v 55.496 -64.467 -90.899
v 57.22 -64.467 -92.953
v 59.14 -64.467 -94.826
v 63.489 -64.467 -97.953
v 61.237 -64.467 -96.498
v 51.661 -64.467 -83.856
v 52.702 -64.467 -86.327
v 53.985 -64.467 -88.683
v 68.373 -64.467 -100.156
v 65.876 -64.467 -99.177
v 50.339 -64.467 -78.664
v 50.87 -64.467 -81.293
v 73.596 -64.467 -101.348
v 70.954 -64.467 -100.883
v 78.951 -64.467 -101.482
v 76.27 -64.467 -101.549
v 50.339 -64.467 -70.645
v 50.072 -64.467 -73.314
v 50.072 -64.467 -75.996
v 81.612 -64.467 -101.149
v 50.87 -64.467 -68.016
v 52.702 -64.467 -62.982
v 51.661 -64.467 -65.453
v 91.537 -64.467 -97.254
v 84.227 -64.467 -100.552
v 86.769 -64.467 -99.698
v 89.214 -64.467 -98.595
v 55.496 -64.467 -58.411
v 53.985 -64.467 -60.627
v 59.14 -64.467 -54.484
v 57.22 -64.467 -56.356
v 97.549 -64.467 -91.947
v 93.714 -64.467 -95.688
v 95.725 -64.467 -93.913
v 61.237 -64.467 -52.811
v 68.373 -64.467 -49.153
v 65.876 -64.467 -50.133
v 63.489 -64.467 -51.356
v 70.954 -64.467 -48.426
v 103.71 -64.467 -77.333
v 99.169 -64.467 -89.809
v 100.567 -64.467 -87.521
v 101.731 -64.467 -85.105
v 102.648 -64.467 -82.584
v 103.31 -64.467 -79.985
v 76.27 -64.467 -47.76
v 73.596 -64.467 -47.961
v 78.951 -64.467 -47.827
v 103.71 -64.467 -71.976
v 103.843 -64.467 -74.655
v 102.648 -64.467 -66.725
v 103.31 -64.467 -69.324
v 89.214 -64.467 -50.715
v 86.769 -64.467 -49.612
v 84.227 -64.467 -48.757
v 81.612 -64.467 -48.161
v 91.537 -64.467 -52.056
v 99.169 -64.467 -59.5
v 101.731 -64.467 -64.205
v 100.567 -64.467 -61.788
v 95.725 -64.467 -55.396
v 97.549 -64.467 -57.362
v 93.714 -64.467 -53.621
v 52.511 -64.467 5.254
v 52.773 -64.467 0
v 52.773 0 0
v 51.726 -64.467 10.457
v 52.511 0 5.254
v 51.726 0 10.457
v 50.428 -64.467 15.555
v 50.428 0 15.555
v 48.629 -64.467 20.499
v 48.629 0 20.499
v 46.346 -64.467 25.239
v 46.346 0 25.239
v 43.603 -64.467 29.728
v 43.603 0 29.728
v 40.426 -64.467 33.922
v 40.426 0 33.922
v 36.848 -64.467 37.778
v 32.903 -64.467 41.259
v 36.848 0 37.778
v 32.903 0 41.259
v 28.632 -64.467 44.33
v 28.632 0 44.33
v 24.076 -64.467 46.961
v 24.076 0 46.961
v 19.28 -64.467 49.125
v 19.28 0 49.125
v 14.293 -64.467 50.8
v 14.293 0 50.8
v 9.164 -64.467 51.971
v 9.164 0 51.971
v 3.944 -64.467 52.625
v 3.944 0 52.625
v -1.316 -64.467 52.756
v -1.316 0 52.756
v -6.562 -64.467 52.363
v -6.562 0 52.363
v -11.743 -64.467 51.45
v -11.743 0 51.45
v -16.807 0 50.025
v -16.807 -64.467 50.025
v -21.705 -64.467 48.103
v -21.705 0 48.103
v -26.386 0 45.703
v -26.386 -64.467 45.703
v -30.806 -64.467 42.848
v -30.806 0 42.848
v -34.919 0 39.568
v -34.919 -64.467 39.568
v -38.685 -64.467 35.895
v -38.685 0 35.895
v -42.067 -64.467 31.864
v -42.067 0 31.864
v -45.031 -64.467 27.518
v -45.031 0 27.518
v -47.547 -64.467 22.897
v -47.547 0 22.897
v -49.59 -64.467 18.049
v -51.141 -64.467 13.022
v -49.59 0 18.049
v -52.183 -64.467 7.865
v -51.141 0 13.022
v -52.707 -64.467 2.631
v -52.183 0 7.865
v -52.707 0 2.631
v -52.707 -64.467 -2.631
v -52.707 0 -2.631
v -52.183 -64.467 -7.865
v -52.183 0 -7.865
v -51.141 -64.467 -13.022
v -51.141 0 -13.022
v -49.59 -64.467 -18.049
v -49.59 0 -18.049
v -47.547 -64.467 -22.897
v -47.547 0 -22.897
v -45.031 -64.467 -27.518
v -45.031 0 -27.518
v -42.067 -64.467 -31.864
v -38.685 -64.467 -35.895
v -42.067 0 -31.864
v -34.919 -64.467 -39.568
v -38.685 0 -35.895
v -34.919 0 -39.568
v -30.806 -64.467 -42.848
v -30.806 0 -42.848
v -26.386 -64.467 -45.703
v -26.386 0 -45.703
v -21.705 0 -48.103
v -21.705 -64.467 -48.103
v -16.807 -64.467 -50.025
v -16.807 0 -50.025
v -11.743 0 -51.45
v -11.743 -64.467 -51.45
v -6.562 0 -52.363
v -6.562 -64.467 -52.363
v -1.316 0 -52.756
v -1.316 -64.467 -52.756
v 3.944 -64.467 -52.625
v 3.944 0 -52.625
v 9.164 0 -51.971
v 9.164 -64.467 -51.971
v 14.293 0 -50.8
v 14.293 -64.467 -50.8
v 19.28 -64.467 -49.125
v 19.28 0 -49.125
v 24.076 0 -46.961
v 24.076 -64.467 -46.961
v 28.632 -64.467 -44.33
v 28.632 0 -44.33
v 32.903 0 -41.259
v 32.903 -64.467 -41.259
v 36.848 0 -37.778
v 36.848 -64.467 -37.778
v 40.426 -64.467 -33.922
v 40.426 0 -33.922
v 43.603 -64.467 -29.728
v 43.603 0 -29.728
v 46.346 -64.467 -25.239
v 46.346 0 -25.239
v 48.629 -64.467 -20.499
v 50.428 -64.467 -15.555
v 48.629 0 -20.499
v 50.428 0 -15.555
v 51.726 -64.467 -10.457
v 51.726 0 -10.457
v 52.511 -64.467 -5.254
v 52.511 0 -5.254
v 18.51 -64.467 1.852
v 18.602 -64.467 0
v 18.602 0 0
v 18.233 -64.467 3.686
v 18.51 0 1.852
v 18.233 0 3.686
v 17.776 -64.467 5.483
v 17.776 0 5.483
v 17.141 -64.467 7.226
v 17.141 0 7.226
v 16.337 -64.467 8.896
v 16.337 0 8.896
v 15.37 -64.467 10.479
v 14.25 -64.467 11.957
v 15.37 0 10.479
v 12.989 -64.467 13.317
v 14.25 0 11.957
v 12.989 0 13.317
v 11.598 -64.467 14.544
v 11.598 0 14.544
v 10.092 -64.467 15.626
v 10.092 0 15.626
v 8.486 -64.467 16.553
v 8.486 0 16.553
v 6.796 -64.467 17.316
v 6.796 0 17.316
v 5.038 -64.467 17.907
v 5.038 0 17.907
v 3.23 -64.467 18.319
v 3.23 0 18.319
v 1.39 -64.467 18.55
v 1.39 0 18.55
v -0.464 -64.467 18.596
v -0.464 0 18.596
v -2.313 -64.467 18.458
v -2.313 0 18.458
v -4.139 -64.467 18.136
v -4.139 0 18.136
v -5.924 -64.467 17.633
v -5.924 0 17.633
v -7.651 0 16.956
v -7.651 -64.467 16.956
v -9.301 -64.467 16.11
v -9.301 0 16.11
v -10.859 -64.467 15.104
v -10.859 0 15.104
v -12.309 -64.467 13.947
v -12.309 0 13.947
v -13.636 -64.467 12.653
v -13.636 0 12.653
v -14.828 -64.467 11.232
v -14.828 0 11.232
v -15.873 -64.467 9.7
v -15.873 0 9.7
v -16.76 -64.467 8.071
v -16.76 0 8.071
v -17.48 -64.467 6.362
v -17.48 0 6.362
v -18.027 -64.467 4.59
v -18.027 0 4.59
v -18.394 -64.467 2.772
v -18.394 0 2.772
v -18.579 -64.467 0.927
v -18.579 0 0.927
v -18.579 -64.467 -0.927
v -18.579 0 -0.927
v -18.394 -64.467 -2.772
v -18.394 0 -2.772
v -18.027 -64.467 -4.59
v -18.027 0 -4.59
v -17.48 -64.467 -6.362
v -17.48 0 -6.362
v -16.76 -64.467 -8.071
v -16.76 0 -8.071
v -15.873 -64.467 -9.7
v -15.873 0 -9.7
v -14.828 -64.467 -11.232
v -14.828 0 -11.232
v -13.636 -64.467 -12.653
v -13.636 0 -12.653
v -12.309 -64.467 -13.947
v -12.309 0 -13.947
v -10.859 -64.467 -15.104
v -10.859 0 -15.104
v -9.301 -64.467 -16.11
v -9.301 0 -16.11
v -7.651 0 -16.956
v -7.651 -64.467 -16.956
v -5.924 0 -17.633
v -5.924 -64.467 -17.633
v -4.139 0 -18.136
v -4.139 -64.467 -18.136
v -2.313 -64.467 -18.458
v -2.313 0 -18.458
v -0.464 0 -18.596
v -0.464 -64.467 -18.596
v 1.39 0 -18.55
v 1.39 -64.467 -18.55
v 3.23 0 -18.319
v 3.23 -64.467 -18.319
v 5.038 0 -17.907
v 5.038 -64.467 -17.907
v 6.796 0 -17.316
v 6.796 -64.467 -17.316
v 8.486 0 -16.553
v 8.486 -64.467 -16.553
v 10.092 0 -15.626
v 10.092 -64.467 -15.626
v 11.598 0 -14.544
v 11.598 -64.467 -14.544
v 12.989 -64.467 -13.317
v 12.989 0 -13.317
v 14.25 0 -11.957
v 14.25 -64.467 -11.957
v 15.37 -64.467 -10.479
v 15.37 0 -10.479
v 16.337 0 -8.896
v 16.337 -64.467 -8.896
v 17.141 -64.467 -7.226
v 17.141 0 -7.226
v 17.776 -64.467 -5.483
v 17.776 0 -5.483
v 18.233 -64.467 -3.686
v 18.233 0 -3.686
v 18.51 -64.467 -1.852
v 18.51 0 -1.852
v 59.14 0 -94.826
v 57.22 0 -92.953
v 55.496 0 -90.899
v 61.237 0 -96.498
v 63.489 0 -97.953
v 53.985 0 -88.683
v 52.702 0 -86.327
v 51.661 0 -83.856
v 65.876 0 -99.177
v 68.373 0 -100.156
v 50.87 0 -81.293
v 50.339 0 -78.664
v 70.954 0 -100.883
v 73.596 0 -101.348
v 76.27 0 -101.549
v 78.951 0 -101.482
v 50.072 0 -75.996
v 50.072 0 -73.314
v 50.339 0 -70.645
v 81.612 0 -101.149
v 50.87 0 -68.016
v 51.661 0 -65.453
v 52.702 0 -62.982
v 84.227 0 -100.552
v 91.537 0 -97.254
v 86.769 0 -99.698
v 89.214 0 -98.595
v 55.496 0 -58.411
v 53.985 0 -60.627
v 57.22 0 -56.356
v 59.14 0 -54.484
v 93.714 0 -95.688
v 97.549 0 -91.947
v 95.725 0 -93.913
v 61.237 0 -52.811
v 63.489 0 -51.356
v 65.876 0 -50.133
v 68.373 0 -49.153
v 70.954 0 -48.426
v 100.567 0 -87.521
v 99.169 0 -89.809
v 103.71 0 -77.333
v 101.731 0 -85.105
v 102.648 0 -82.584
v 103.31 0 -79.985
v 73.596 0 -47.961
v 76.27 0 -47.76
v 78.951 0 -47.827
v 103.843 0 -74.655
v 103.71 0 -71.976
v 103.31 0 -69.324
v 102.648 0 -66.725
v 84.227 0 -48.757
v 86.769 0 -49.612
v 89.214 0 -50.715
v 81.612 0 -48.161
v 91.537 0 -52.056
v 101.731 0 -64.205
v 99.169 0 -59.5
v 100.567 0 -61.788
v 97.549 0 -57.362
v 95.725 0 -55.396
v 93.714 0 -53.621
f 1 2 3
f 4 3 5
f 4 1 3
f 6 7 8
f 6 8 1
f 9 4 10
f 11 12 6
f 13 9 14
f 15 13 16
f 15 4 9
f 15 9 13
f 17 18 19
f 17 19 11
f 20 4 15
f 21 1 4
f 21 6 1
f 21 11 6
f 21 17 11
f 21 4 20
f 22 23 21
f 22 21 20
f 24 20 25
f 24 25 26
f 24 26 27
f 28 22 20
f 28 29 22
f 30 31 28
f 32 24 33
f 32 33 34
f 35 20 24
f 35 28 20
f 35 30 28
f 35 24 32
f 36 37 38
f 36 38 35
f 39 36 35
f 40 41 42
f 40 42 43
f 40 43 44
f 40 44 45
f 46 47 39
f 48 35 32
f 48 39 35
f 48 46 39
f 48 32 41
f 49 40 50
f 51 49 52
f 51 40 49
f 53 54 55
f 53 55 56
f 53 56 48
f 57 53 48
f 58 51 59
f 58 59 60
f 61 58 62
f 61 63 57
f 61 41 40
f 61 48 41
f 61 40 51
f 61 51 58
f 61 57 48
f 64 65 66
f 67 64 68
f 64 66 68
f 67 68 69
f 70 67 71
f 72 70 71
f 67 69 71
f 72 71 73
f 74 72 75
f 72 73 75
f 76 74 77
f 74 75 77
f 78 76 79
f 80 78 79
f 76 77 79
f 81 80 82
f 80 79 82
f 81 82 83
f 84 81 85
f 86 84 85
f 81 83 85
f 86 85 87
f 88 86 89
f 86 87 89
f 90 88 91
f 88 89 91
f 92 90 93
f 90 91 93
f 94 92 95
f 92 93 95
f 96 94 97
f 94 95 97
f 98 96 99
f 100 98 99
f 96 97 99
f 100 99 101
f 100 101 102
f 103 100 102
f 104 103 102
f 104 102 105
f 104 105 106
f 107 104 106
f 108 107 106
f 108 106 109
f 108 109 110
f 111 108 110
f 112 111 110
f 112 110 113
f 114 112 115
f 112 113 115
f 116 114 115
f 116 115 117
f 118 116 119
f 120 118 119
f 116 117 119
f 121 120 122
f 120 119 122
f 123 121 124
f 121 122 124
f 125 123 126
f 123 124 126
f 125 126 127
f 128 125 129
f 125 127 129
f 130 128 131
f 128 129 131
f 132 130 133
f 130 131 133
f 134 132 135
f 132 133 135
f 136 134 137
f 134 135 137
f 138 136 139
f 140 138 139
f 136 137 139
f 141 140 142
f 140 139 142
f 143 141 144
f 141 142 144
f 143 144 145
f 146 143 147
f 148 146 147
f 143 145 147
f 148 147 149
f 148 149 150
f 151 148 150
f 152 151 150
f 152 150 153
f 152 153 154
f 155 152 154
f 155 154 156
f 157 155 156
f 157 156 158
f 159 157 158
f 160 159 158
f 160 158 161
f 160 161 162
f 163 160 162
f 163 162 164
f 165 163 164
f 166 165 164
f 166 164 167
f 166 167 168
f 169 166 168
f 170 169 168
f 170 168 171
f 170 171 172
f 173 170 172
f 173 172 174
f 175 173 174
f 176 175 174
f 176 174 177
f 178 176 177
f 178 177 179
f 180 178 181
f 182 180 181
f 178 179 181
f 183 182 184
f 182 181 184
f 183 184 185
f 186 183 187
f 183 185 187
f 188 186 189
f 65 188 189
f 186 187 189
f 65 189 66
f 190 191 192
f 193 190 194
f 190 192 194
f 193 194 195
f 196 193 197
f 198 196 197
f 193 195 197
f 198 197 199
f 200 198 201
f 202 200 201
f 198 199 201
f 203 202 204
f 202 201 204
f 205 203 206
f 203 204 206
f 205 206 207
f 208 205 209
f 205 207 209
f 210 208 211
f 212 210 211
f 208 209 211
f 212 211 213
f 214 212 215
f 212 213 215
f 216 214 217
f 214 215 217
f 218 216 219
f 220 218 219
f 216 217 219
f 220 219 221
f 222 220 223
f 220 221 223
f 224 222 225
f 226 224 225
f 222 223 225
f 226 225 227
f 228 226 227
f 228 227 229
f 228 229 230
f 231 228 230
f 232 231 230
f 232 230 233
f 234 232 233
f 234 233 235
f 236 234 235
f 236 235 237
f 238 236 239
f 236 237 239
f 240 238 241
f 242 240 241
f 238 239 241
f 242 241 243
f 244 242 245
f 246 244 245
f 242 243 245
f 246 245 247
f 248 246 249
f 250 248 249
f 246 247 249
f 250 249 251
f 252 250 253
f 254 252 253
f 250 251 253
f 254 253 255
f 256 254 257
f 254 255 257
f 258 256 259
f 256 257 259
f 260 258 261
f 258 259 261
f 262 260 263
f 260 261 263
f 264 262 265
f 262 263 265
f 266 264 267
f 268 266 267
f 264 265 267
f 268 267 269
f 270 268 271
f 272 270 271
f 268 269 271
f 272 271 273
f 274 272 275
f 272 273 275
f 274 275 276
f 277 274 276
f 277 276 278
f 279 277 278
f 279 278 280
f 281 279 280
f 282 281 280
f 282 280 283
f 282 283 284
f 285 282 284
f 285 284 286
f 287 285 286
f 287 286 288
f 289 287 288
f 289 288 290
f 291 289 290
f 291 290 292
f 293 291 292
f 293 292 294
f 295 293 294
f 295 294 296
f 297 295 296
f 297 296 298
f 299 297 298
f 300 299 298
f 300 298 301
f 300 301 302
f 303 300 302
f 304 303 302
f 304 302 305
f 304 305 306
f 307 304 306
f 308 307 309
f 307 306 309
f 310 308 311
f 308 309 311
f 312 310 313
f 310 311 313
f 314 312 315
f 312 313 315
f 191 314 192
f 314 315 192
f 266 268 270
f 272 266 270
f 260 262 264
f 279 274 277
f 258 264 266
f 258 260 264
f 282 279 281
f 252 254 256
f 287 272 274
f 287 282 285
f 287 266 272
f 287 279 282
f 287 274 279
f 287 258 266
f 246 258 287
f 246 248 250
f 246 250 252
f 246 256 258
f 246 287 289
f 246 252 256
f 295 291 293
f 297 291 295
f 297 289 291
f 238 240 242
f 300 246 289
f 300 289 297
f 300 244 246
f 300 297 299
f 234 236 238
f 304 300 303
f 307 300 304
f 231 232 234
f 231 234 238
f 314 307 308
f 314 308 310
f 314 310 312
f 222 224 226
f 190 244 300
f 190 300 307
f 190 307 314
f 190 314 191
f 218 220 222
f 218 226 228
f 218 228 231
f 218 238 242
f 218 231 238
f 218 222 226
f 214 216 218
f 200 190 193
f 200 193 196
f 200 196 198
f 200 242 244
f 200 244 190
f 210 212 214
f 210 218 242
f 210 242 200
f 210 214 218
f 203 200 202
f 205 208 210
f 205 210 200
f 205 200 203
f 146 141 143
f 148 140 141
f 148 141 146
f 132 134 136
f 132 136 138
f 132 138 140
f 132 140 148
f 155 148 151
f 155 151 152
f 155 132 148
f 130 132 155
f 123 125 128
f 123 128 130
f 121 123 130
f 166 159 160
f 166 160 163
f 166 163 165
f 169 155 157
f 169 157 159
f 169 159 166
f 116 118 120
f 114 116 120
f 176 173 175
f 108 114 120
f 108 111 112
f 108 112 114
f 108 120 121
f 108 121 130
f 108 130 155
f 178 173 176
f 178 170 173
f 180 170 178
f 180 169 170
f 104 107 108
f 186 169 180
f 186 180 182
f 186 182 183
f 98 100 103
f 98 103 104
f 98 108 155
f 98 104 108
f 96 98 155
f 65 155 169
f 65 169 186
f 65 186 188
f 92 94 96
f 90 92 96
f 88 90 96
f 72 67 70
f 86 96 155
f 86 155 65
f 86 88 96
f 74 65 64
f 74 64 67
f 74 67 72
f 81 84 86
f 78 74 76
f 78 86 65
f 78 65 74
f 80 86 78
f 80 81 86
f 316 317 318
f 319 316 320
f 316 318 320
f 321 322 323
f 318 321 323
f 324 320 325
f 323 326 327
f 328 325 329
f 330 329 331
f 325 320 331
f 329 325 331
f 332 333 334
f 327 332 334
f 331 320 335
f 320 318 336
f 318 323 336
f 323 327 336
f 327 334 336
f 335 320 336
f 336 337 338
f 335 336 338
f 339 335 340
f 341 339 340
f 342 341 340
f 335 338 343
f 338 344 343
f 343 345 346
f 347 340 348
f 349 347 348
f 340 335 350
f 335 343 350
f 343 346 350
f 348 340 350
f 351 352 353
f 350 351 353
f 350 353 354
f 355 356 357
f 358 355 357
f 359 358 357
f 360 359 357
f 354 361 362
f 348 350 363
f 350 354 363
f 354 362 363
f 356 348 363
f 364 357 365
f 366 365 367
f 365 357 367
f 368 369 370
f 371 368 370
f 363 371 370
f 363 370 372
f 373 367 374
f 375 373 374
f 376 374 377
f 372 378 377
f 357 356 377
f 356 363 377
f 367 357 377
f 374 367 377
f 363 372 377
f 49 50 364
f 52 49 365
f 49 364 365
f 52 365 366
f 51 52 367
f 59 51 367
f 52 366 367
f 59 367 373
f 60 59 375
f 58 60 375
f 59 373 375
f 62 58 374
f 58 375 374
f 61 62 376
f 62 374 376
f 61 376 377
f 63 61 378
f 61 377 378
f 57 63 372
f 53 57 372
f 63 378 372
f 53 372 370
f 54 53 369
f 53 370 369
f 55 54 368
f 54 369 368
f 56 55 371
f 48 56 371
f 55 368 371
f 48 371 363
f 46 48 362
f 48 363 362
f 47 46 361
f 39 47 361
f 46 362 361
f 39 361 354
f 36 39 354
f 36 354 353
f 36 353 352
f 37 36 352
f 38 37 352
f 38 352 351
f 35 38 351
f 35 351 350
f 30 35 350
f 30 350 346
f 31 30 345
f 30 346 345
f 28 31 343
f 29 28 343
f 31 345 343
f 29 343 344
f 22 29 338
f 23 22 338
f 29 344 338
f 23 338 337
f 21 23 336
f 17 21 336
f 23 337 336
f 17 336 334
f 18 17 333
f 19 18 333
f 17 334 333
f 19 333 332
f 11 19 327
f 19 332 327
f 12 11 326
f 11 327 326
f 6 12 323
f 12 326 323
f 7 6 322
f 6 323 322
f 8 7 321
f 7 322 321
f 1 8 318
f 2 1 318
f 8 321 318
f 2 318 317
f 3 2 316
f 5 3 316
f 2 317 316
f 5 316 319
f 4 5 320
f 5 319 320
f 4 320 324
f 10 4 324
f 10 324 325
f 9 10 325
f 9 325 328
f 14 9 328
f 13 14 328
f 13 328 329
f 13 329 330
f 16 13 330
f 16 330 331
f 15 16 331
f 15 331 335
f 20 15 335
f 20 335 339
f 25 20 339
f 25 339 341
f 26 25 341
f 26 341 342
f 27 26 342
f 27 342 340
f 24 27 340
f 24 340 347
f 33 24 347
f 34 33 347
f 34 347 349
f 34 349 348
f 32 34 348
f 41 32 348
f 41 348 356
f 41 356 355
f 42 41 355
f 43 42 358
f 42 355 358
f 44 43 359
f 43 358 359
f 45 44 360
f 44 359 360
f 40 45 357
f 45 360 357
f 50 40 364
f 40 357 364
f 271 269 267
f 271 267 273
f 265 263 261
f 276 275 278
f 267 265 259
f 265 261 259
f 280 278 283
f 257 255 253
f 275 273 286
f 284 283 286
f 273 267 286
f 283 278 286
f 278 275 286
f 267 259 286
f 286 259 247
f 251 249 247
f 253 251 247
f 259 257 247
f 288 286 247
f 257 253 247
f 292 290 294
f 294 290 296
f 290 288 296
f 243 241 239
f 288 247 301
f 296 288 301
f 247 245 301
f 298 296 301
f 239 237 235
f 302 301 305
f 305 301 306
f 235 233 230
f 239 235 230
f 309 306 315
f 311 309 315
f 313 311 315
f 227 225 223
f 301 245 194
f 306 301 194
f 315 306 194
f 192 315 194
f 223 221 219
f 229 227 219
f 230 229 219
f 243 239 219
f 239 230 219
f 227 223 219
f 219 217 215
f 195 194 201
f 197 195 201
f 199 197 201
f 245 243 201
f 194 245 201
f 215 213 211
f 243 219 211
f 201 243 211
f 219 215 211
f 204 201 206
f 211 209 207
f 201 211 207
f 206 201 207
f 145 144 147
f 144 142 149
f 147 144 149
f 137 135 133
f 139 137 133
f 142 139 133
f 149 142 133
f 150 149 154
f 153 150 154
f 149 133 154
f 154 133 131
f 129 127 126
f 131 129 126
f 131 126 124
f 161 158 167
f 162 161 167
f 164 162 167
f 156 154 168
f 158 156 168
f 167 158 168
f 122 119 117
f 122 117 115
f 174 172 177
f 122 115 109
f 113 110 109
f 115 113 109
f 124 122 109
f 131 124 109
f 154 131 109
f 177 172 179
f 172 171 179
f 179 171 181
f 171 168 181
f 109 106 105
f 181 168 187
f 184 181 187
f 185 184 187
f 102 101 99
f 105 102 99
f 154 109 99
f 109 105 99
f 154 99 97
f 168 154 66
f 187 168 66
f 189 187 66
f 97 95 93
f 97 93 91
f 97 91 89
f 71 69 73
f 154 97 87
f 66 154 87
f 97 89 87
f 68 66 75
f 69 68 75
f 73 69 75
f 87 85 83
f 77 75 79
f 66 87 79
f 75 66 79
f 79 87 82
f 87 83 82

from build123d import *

# Parameters (mm, degrees)
F2_R     = 26.9026463435
F4_DEPTH = 64.4670631737
F1_R     = 18.6019651269
F0_R     = 52.7727745314


with BuildPart() as f4:
    # F2 (on Front) → F4 (new body)
    with BuildSketch(Plane.XZ):
        with Locations((76.9407525659, -74.6546387672)):
            Circle(F2_R)
    extrude(amount=F4_DEPTH)


with BuildPart() as f4b:
    # F1 (on face) → F4, piece 2 (new body)
    with BuildSketch(Plane.XZ):
        Circle(F1_R)
    extrude(amount=F4_DEPTH)


with BuildPart() as f4c:
    # F0 (on Front) → F4, piece 3 (new body)
    with BuildSketch(Plane.XZ):
        Circle(F0_R)
    extrude(amount=F4_DEPTH)


solid = Compound([f4.part, f4b.part, f4c.part])
